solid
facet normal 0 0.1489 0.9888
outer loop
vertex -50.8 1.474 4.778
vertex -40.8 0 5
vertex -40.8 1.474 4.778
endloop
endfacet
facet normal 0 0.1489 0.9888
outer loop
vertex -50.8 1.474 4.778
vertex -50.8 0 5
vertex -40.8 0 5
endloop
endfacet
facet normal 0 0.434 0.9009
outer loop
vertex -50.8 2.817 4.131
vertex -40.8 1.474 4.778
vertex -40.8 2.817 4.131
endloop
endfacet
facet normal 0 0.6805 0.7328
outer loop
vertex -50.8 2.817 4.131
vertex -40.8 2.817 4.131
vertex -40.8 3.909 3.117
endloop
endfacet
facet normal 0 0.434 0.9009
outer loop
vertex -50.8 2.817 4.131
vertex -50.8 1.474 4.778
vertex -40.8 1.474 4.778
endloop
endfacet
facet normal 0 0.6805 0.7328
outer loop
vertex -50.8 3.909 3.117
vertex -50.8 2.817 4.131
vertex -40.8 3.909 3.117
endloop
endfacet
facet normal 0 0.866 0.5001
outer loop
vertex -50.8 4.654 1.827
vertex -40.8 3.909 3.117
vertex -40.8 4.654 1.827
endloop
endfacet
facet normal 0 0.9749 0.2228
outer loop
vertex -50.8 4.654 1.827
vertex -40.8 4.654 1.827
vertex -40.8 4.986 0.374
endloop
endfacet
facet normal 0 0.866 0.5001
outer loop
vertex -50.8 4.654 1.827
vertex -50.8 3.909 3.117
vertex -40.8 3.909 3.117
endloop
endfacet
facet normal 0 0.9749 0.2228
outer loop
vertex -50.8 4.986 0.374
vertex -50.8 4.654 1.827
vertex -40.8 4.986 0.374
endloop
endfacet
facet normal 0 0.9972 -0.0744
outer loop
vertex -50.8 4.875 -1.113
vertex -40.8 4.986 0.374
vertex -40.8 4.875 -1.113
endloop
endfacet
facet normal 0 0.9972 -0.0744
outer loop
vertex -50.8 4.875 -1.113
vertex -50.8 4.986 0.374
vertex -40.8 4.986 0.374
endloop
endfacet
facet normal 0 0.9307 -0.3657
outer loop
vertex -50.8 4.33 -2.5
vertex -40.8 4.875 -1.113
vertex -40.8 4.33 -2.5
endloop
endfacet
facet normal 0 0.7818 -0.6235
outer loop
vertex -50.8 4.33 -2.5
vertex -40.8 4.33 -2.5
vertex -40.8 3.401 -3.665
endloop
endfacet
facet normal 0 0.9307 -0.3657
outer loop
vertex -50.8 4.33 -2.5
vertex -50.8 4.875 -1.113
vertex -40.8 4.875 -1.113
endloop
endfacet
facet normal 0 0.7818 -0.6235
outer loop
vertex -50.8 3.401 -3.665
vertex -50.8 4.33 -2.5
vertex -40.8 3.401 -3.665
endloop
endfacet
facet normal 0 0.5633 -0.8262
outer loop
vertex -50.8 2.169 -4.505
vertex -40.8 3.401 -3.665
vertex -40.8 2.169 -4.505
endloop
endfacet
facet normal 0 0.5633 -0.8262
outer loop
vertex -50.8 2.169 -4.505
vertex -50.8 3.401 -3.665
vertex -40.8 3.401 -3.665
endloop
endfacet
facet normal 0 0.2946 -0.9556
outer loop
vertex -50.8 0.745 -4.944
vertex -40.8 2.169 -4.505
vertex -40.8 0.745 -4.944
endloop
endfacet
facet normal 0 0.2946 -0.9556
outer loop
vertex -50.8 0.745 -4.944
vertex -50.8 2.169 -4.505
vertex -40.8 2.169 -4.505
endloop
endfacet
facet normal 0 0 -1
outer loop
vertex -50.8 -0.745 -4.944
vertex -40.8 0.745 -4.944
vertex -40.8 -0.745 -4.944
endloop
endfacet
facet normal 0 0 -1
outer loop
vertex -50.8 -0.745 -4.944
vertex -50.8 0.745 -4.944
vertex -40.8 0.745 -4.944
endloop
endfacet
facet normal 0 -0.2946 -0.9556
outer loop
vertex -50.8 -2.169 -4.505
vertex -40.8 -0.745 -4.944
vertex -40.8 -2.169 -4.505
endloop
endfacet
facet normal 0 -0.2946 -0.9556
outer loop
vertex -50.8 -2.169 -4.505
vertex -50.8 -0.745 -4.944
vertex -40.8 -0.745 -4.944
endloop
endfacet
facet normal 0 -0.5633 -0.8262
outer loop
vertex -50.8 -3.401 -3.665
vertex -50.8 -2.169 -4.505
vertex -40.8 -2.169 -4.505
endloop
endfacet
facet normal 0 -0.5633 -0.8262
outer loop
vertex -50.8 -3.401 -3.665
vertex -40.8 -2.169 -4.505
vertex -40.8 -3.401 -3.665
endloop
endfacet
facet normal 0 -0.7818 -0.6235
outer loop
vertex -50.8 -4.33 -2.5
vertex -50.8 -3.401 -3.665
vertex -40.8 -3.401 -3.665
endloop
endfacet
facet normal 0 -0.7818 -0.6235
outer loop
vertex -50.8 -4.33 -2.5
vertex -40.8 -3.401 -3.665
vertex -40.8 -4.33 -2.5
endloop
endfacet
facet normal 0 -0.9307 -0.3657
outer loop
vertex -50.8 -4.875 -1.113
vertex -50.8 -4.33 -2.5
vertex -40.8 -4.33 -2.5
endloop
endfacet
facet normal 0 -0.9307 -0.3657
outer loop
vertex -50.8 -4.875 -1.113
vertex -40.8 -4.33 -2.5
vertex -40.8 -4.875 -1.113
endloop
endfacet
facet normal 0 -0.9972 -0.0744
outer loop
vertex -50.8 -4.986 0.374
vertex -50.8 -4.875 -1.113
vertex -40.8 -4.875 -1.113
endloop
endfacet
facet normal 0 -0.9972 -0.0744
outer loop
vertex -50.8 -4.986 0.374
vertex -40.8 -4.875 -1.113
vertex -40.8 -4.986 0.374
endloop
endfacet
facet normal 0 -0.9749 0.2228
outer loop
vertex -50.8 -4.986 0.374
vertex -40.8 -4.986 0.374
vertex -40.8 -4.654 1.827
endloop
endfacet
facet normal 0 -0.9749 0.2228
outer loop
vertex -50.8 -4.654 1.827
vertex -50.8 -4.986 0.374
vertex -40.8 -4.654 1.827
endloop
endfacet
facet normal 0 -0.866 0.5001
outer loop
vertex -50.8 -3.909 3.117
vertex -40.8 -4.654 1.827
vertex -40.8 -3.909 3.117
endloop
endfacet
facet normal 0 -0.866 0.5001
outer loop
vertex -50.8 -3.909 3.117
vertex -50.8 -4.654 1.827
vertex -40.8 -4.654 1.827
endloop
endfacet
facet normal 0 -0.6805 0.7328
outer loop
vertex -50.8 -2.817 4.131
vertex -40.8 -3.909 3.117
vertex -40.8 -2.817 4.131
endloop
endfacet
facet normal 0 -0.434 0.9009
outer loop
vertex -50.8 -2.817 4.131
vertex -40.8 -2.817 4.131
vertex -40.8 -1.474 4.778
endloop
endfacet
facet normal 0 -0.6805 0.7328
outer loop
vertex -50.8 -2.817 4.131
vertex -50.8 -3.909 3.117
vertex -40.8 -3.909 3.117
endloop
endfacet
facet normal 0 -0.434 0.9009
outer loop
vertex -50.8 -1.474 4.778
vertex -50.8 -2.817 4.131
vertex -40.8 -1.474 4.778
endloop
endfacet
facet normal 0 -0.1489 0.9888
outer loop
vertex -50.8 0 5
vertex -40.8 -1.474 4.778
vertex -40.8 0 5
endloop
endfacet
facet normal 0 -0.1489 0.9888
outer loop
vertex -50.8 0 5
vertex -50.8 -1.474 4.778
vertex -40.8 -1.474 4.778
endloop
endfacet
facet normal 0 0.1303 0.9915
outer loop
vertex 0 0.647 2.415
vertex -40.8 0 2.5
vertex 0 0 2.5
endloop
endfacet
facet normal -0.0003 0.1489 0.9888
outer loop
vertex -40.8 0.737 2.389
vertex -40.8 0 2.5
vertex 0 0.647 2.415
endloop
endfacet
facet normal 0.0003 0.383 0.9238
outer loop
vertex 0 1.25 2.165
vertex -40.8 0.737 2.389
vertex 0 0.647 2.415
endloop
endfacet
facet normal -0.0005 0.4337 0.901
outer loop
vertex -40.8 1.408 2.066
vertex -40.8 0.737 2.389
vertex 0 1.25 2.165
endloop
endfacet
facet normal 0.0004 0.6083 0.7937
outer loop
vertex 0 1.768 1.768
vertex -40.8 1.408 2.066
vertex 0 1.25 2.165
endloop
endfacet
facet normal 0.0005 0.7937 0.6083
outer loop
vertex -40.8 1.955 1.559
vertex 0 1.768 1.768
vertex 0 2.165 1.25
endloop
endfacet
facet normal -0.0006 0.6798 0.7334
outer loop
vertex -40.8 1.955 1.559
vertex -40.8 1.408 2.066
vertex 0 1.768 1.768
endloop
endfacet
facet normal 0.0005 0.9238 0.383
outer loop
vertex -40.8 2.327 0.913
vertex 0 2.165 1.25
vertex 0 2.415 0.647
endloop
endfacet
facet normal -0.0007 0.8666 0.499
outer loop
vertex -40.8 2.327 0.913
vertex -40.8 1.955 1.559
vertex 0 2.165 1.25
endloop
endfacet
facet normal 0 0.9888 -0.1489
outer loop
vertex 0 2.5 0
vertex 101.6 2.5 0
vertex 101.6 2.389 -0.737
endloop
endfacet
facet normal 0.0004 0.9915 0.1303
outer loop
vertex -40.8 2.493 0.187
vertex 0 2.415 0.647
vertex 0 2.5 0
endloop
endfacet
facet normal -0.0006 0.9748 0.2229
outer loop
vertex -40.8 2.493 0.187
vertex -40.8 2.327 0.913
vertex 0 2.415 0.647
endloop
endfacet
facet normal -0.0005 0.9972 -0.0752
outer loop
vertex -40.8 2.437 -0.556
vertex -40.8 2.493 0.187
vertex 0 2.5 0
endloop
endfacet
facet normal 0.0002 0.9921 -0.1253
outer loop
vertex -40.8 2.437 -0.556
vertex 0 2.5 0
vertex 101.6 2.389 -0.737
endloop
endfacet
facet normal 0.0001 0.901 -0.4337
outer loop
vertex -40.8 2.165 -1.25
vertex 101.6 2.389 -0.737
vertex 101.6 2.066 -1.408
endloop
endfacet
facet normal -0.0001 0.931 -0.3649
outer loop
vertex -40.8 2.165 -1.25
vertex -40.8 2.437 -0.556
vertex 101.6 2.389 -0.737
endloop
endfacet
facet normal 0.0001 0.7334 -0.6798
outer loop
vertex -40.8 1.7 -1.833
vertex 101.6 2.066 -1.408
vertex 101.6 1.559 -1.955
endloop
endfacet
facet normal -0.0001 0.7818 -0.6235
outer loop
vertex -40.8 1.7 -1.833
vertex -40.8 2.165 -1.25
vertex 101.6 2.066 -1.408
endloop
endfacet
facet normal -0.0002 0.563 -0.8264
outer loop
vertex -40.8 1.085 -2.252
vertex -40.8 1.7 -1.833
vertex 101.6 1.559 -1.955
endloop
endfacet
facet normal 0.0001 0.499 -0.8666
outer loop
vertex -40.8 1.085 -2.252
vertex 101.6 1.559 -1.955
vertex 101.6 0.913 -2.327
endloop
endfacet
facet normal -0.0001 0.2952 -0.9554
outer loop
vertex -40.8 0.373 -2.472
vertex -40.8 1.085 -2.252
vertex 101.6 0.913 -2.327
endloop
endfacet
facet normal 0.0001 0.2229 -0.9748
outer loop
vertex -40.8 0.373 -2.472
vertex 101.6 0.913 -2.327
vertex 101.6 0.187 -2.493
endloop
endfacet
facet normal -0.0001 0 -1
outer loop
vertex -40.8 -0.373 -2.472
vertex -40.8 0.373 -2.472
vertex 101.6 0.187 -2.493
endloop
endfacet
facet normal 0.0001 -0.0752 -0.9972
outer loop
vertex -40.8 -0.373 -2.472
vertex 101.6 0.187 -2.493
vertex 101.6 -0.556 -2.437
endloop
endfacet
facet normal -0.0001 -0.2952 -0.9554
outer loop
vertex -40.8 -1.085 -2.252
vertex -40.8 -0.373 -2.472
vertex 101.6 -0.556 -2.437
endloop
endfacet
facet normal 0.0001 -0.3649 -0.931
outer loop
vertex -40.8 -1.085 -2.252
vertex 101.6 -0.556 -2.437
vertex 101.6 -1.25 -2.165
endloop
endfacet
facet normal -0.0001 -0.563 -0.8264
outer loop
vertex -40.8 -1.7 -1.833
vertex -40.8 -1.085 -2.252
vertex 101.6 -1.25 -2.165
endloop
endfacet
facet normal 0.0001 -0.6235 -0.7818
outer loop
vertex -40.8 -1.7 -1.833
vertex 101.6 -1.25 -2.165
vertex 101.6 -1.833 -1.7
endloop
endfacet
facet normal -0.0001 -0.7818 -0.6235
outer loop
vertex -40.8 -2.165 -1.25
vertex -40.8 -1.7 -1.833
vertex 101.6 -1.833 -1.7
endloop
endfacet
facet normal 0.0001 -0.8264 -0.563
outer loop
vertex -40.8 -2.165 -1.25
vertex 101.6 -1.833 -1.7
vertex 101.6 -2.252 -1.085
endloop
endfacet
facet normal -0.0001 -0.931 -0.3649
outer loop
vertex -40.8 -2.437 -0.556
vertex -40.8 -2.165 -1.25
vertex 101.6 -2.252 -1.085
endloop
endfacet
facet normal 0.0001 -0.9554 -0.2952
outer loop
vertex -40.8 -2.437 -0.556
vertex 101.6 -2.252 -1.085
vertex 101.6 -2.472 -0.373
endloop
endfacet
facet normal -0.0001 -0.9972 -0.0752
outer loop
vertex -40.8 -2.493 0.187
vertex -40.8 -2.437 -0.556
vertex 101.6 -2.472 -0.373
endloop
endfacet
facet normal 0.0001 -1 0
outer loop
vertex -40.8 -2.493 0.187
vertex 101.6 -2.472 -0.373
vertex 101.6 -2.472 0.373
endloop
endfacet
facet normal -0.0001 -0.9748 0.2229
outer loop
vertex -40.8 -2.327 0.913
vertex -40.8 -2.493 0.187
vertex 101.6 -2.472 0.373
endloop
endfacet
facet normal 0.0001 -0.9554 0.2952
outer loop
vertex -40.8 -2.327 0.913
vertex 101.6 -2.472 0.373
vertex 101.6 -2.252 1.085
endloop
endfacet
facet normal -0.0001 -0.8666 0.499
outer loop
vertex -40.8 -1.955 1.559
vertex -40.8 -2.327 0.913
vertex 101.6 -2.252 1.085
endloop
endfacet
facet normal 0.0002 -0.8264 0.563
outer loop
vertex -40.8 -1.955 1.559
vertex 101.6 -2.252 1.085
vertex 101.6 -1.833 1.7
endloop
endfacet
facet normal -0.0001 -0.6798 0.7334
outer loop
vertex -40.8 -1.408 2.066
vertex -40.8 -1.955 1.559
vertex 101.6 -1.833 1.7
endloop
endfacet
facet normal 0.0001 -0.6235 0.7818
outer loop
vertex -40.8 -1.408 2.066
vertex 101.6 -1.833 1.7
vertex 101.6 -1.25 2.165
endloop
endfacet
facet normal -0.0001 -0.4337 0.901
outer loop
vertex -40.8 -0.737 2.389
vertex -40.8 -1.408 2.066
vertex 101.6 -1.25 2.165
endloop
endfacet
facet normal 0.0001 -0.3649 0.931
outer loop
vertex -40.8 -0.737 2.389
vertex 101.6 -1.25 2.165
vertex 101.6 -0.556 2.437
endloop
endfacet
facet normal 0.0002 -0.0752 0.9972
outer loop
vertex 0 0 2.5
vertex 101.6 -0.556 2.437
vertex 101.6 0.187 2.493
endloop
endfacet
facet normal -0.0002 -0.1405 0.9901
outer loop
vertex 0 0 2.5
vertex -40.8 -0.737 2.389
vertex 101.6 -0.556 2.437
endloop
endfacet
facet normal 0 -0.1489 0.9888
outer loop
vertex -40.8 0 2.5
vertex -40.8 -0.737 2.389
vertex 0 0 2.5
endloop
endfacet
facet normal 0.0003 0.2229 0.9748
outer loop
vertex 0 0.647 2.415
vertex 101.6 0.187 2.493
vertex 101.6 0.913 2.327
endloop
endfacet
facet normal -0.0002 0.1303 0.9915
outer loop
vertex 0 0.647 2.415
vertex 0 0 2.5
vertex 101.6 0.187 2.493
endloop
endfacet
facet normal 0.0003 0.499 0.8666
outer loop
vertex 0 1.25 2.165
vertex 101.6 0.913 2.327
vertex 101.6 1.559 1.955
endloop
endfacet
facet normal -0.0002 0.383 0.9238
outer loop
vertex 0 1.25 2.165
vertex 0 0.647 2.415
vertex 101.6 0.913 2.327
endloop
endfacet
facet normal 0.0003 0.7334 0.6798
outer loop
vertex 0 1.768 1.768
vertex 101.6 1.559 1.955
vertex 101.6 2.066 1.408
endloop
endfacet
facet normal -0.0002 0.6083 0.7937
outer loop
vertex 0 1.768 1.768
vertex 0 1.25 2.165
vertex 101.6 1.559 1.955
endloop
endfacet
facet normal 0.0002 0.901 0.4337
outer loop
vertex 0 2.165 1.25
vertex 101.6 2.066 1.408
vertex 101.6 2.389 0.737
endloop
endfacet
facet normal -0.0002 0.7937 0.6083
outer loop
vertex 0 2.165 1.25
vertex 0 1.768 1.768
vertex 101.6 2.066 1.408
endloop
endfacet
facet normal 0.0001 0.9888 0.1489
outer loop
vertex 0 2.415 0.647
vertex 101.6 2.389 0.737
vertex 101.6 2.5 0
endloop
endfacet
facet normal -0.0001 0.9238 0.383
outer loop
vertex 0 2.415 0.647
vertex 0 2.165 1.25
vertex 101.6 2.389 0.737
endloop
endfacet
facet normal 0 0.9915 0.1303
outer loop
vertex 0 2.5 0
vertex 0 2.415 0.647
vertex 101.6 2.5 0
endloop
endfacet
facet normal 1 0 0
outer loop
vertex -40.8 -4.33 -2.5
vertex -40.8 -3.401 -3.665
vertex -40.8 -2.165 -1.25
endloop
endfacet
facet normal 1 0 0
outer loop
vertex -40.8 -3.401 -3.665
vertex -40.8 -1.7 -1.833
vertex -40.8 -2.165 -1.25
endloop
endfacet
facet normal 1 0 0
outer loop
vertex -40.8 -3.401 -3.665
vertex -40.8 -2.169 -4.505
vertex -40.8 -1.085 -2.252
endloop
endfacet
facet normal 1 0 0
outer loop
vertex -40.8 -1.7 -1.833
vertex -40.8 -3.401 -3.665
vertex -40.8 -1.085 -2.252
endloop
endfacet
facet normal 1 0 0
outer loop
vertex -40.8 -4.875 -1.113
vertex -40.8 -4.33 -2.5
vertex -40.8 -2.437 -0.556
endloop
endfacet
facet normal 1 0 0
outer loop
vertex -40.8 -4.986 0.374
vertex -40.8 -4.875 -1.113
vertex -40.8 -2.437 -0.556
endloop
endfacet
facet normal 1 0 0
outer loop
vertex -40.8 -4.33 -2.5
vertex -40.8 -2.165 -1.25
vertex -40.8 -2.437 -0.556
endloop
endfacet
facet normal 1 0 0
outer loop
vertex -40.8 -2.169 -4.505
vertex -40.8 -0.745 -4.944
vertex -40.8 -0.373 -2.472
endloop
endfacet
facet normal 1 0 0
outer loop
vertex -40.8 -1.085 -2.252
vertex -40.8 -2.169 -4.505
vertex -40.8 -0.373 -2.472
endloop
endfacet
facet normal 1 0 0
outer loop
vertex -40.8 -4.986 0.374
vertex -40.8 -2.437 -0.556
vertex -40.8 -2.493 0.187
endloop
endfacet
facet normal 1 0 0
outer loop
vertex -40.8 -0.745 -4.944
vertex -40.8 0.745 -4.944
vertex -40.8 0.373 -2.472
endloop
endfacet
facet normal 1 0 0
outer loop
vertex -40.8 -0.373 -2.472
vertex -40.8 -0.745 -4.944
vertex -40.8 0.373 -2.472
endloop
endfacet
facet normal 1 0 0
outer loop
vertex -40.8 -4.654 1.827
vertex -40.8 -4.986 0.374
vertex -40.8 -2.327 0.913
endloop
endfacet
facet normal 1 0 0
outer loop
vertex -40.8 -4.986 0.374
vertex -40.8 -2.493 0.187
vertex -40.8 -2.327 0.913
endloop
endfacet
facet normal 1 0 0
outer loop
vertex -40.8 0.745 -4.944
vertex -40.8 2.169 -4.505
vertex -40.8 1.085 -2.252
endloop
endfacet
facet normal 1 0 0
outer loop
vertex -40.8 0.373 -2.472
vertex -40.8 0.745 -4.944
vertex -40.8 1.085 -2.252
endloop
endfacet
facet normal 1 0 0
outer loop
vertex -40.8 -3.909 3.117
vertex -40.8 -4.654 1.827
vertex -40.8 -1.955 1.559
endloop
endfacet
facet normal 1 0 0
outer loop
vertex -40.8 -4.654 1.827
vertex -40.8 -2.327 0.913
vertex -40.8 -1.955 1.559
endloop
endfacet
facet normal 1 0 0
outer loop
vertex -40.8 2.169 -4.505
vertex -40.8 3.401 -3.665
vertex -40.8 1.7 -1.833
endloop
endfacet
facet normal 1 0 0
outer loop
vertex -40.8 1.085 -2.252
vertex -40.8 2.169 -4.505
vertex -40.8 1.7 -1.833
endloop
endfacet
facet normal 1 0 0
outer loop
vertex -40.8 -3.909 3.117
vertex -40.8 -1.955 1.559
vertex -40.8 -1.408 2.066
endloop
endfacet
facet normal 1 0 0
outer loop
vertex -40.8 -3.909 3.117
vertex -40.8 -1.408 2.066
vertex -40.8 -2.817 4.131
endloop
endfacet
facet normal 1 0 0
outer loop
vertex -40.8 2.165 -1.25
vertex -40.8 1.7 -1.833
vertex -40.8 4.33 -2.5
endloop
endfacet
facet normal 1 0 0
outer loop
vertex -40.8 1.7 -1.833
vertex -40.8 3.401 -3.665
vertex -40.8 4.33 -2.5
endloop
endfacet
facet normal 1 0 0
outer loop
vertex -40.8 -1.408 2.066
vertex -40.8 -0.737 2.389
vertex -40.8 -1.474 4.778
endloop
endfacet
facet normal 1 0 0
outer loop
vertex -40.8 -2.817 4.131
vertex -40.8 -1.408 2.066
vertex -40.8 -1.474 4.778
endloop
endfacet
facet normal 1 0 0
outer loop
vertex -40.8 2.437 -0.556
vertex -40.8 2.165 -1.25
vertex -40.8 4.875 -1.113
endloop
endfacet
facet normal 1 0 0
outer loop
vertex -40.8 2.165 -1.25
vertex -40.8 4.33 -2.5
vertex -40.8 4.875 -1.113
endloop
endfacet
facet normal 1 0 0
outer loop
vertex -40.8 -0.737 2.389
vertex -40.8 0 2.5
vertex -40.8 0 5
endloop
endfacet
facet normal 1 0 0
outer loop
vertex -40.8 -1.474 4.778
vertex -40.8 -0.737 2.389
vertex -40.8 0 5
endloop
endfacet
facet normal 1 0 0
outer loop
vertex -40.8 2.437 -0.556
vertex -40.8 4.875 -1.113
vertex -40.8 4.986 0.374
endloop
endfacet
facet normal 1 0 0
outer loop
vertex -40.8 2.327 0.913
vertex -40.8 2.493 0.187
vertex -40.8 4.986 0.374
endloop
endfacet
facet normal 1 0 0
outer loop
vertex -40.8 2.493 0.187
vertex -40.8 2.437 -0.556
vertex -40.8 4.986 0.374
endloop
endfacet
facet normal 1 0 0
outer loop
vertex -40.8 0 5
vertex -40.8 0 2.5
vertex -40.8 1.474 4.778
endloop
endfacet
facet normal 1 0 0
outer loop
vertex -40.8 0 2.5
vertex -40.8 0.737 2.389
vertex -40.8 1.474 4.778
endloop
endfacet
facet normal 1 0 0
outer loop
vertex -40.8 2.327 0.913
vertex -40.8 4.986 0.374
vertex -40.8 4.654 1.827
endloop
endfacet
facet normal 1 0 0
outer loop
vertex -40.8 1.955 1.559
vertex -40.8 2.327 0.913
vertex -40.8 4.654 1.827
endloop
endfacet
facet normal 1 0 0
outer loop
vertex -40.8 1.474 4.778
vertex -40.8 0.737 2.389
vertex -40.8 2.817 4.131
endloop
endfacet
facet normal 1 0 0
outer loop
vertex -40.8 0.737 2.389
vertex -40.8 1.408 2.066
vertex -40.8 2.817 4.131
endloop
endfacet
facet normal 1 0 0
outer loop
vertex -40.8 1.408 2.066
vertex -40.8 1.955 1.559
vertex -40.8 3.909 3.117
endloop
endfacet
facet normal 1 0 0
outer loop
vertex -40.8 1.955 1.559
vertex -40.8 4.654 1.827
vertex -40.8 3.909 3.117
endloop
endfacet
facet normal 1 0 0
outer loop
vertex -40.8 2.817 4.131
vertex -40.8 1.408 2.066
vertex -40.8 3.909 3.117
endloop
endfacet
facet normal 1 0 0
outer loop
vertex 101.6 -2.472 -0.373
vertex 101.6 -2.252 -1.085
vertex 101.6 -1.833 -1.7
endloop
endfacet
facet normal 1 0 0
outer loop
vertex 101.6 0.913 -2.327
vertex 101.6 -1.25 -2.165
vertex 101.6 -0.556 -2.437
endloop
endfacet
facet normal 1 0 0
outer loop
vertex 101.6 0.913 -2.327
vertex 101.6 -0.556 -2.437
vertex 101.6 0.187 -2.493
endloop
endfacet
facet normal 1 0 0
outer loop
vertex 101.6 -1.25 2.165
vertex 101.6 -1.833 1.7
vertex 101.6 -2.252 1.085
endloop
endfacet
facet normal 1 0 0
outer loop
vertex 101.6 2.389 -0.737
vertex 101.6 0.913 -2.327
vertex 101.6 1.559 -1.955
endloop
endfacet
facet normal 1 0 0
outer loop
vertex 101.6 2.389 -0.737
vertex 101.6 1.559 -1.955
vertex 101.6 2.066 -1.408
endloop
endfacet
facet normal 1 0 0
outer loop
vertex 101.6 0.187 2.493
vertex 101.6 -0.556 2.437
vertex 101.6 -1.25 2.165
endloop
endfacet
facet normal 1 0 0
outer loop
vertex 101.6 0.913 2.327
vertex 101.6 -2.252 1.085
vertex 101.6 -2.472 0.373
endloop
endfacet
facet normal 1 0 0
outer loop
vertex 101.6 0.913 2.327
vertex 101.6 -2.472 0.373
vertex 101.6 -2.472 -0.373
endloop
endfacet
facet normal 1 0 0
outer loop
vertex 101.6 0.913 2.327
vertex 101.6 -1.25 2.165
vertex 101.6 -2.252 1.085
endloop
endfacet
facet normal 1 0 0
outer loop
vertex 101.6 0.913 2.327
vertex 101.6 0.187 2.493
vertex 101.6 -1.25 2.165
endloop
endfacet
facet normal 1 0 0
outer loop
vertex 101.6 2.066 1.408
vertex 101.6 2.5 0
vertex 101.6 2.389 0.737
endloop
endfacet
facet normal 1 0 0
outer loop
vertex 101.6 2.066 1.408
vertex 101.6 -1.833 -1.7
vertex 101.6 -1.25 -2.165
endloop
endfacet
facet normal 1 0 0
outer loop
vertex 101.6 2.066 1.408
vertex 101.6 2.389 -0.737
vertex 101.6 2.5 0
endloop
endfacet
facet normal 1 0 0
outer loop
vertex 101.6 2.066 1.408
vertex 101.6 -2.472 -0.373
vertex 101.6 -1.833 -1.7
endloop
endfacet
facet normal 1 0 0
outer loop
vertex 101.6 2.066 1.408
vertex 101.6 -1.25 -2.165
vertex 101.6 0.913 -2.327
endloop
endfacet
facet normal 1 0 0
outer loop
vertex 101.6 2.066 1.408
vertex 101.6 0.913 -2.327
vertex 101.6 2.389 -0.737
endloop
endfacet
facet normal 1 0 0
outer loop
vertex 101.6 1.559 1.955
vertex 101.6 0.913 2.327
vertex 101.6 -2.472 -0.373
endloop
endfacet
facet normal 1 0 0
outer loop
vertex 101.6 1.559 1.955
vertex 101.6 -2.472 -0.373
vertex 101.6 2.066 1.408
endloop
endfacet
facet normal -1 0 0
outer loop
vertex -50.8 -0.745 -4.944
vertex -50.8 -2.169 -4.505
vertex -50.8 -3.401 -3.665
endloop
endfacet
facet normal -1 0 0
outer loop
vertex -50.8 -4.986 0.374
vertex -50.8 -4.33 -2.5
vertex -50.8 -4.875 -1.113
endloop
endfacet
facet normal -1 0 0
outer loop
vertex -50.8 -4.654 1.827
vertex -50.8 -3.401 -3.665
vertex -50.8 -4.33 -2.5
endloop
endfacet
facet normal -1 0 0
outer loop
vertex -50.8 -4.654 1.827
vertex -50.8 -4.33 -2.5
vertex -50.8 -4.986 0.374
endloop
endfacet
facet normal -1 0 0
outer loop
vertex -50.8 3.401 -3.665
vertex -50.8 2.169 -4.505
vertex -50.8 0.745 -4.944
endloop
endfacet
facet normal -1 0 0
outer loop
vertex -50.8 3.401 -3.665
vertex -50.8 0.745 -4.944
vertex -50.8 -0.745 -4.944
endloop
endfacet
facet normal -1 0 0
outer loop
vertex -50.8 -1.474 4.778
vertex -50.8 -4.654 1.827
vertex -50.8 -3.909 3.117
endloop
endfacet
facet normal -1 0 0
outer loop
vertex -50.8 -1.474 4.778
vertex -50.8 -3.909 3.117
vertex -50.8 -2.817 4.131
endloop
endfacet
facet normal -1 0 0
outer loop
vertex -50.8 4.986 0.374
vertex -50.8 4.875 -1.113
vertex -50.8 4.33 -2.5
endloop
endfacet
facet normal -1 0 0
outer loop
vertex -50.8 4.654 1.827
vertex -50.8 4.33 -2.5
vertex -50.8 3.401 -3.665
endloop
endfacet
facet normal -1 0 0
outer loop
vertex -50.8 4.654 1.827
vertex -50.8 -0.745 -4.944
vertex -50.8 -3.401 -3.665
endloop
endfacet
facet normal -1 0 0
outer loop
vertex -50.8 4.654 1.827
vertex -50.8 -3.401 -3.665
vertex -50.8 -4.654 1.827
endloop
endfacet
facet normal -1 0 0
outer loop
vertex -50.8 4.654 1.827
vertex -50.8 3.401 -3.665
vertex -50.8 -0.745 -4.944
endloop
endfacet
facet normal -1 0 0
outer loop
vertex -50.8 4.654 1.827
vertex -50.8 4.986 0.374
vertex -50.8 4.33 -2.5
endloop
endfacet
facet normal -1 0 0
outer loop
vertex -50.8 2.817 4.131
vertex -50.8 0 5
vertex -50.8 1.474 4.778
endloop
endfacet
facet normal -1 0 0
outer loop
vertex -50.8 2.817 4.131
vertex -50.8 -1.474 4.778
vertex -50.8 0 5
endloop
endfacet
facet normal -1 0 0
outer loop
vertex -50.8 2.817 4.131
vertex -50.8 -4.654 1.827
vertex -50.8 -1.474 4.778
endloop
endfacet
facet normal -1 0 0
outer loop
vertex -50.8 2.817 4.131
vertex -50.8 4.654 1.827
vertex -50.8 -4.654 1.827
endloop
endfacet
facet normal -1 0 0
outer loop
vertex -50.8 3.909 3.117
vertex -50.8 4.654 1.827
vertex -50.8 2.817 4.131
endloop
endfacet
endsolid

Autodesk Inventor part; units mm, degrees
ref_plane "YZ Plane" through (0, 0, 0) normal (1, 0, 0) x (0, 1, 0)
ref_plane "XZ Plane" through (0, 0, 0) normal (0, 1, 0) x (-1, 0, 0)
ref_plane "XY Plane" through (0, 0, 0) normal (0, 0, 1) x (1, 0, 0)
sketch "Sketch1" plane through (0, 0, 0) normal (1, 0, 0) x (0, 1, 0)
  circle A0 centre (0, 0) radius 2.5
  dimension "d0" = 5
extrude "Extrusion1" add sketch "Sketch1" along normal blind 101.6
sketch "Sketch2" plane through (0, 0, 0) normal (-1, 0, 0) x (0, 0, 1)
  point P0 (0, 0)
sketch "Sketch3" plane through (0, 0, 0) normal (-1, 0, 0) x (0, 0, 1)
  circle A0 centre (0, 0) radius 2.5
  dimension "d3" = 5
extrude "Extrusion2" add sketch "Sketch3" along normal blind 50.8
sketch "Sketch4" plane through (101.6, 0, 0) normal (1, 0, 0) x (0, 0, -1)
  point P0 (0, 0)
sketch "Sketch5" plane through (-50.8, 0, 0) normal (-1, 0, 0) x (0, 0, 1)
  circle A0 centre (0, 0) radius 5
  dimension "d6" = 10
extrude "Extrusion3" add sketch "Sketch5" against normal blind 10
properties part number "cylindre plateform"
